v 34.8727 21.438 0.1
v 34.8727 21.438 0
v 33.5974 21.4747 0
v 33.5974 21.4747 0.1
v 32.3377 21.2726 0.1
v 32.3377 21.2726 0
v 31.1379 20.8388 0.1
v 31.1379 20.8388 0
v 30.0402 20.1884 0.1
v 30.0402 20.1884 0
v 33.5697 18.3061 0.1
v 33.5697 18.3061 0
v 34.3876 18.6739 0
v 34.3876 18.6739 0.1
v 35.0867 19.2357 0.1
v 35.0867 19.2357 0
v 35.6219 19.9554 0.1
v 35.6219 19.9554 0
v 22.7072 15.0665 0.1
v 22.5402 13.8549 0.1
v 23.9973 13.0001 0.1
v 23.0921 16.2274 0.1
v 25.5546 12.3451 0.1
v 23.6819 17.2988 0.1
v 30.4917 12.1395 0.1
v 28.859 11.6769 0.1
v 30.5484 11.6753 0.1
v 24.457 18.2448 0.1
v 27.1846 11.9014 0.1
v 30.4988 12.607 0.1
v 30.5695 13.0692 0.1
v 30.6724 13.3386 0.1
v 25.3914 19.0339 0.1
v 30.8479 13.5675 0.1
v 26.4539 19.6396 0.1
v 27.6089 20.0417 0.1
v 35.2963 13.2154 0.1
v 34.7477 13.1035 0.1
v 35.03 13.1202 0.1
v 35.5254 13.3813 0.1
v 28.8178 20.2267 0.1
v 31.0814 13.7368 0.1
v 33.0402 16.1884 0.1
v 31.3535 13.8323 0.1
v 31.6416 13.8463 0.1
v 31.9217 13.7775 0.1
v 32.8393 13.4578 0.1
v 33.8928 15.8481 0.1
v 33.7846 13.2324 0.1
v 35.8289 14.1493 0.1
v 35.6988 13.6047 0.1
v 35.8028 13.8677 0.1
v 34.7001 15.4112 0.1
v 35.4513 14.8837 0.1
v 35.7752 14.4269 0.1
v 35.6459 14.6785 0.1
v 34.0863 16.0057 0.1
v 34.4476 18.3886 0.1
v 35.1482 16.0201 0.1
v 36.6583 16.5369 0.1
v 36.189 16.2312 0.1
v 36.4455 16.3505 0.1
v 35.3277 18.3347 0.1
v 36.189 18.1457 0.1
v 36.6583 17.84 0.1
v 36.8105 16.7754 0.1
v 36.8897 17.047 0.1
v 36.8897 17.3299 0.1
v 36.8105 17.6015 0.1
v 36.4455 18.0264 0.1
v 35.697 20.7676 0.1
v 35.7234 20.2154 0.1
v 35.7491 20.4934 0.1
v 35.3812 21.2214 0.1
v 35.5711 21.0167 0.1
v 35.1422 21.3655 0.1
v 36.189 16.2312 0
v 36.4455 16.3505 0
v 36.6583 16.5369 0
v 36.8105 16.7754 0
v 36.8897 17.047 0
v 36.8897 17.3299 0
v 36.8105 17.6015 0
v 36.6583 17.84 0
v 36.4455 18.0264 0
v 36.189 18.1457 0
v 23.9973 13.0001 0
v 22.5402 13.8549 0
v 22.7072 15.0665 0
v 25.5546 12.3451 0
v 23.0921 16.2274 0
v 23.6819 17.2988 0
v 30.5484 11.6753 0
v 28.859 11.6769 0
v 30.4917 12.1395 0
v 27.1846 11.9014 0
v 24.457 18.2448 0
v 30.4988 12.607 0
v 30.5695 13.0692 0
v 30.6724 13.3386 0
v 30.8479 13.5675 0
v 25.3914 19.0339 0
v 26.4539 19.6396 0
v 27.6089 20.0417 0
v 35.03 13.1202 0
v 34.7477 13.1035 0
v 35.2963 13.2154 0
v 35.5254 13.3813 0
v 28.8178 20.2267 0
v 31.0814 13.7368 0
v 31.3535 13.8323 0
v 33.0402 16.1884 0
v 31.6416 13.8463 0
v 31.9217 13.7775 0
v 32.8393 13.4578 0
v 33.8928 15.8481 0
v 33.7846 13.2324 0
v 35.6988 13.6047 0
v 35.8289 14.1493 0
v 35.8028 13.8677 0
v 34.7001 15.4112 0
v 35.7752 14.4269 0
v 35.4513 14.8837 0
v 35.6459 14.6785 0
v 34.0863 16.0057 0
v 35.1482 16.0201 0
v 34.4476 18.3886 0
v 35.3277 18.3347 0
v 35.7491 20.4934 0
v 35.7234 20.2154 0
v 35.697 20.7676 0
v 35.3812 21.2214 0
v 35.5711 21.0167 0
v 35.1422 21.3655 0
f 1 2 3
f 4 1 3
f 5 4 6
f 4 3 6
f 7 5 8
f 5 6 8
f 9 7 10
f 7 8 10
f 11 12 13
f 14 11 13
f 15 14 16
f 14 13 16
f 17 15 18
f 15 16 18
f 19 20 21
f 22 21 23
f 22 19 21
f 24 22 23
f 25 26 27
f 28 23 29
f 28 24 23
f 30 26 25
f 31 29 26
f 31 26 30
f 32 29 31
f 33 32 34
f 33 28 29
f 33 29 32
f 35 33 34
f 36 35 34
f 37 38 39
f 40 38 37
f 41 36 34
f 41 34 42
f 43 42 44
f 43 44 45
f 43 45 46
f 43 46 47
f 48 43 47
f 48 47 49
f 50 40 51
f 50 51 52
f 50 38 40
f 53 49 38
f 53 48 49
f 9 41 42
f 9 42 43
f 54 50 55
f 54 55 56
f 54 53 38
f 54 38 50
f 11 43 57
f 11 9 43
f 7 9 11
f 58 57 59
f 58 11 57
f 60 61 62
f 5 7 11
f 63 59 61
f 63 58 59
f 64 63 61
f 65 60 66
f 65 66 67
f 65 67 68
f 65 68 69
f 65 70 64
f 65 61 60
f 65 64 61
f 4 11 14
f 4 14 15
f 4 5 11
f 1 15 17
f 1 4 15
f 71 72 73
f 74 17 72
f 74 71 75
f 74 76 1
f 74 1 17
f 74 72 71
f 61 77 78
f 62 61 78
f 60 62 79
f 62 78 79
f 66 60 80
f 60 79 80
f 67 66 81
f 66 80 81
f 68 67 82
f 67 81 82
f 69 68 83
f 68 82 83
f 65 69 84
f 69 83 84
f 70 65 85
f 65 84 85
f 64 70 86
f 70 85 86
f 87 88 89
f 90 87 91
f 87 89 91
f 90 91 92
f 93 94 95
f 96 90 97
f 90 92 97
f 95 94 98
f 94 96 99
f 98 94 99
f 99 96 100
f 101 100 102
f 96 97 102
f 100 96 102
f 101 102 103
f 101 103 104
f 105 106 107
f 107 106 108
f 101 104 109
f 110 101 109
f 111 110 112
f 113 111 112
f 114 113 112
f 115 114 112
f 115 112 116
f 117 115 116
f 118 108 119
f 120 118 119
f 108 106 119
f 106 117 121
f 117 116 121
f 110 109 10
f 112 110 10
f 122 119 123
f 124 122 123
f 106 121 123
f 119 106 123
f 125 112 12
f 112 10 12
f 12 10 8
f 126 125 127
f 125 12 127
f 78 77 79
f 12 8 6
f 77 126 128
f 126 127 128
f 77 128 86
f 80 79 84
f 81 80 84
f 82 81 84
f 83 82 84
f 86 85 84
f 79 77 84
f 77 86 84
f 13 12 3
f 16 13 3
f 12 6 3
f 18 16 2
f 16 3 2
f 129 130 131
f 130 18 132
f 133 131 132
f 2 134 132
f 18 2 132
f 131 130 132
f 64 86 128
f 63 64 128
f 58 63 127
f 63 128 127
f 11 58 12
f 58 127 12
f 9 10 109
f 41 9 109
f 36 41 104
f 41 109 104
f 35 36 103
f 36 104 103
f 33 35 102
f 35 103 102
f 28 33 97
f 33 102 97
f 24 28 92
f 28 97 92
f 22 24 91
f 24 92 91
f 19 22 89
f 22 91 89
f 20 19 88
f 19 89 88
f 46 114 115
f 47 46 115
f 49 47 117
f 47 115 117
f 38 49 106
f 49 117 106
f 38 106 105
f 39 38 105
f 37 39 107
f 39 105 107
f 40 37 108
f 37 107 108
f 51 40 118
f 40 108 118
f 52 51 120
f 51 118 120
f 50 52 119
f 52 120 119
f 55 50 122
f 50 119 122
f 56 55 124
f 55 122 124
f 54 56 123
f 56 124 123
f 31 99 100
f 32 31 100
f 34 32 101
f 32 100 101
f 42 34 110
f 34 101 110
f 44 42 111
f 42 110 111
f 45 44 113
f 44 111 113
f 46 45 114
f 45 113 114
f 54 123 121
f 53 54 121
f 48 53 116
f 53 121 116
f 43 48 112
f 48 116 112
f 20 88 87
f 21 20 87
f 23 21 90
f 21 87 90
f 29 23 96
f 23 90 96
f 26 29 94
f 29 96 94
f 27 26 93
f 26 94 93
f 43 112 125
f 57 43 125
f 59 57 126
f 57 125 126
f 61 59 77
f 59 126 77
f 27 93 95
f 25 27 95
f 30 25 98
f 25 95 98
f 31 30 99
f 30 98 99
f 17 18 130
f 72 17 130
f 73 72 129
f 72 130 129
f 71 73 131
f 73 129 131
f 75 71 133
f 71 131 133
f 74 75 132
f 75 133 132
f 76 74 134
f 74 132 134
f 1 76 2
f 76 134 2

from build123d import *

# Parameters (mm, degrees)
SALIENTE_EXTRUIR1_DEPTH = 0.1


with BuildPart() as part:
    # Model → Saliente-Extruir1 (new body)
    with BuildSketch(Plane.XY):
        with BuildLine():
            ThreePointArc((22.540248989, 13.854945853), (26.36224915, 12.09625195), (30.548359243, 11.675334187))
            ThreePointArc((30.548359243, 11.675334187), (30.487312629, 12.373336734), (30.5695137, 13.069165182))
            ThreePointArc((30.5695137, 13.069165182), (31.081390856, 13.736758239), (31.921654238, 13.777454212))
            ThreePointArc((31.921654238, 13.777454212), (33.309090368, 13.333130187), (34.7477202, 13.103462905))
            ThreePointArc((34.7477202, 13.103462905), (35.76012095, 13.732496208), (35.451331706, 14.883707473))
            ThreePointArc((35.451331706, 14.883707473), (34.302777703, 15.641386071), (33.040248989, 16.188445853))
            ThreePointArc((33.040248989, 16.188445853), (34.617609881, 15.988093646), (36.188952789, 16.231177692))
            ThreePointArc((36.188952789, 16.231177692), (36.899751011, 17.188445853), (36.188952789, 18.145714014))
            ThreePointArc((36.188952789, 18.145714014), (34.888660423, 18.378666365), (33.569660753, 18.306092912))
            ThreePointArc((33.569660753, 18.306092912), (34.755020368, 18.932581608), (35.621884252, 19.955378023))
            ThreePointArc((35.621884252, 19.955378023), (35.642787011, 20.89656979), (34.872667415, 21.438044328))
            ThreePointArc((34.872667415, 21.438044328), (32.337672311, 21.27261115), (30.040248989, 20.188445853))
            ThreePointArc((30.040248989, 20.188445853), (24.906113256, 18.660760825), (22.540248989, 13.854945853))
        make_face()
    extrude(amount=SALIENTE_EXTRUIR1_DEPTH)


solid = part.part
